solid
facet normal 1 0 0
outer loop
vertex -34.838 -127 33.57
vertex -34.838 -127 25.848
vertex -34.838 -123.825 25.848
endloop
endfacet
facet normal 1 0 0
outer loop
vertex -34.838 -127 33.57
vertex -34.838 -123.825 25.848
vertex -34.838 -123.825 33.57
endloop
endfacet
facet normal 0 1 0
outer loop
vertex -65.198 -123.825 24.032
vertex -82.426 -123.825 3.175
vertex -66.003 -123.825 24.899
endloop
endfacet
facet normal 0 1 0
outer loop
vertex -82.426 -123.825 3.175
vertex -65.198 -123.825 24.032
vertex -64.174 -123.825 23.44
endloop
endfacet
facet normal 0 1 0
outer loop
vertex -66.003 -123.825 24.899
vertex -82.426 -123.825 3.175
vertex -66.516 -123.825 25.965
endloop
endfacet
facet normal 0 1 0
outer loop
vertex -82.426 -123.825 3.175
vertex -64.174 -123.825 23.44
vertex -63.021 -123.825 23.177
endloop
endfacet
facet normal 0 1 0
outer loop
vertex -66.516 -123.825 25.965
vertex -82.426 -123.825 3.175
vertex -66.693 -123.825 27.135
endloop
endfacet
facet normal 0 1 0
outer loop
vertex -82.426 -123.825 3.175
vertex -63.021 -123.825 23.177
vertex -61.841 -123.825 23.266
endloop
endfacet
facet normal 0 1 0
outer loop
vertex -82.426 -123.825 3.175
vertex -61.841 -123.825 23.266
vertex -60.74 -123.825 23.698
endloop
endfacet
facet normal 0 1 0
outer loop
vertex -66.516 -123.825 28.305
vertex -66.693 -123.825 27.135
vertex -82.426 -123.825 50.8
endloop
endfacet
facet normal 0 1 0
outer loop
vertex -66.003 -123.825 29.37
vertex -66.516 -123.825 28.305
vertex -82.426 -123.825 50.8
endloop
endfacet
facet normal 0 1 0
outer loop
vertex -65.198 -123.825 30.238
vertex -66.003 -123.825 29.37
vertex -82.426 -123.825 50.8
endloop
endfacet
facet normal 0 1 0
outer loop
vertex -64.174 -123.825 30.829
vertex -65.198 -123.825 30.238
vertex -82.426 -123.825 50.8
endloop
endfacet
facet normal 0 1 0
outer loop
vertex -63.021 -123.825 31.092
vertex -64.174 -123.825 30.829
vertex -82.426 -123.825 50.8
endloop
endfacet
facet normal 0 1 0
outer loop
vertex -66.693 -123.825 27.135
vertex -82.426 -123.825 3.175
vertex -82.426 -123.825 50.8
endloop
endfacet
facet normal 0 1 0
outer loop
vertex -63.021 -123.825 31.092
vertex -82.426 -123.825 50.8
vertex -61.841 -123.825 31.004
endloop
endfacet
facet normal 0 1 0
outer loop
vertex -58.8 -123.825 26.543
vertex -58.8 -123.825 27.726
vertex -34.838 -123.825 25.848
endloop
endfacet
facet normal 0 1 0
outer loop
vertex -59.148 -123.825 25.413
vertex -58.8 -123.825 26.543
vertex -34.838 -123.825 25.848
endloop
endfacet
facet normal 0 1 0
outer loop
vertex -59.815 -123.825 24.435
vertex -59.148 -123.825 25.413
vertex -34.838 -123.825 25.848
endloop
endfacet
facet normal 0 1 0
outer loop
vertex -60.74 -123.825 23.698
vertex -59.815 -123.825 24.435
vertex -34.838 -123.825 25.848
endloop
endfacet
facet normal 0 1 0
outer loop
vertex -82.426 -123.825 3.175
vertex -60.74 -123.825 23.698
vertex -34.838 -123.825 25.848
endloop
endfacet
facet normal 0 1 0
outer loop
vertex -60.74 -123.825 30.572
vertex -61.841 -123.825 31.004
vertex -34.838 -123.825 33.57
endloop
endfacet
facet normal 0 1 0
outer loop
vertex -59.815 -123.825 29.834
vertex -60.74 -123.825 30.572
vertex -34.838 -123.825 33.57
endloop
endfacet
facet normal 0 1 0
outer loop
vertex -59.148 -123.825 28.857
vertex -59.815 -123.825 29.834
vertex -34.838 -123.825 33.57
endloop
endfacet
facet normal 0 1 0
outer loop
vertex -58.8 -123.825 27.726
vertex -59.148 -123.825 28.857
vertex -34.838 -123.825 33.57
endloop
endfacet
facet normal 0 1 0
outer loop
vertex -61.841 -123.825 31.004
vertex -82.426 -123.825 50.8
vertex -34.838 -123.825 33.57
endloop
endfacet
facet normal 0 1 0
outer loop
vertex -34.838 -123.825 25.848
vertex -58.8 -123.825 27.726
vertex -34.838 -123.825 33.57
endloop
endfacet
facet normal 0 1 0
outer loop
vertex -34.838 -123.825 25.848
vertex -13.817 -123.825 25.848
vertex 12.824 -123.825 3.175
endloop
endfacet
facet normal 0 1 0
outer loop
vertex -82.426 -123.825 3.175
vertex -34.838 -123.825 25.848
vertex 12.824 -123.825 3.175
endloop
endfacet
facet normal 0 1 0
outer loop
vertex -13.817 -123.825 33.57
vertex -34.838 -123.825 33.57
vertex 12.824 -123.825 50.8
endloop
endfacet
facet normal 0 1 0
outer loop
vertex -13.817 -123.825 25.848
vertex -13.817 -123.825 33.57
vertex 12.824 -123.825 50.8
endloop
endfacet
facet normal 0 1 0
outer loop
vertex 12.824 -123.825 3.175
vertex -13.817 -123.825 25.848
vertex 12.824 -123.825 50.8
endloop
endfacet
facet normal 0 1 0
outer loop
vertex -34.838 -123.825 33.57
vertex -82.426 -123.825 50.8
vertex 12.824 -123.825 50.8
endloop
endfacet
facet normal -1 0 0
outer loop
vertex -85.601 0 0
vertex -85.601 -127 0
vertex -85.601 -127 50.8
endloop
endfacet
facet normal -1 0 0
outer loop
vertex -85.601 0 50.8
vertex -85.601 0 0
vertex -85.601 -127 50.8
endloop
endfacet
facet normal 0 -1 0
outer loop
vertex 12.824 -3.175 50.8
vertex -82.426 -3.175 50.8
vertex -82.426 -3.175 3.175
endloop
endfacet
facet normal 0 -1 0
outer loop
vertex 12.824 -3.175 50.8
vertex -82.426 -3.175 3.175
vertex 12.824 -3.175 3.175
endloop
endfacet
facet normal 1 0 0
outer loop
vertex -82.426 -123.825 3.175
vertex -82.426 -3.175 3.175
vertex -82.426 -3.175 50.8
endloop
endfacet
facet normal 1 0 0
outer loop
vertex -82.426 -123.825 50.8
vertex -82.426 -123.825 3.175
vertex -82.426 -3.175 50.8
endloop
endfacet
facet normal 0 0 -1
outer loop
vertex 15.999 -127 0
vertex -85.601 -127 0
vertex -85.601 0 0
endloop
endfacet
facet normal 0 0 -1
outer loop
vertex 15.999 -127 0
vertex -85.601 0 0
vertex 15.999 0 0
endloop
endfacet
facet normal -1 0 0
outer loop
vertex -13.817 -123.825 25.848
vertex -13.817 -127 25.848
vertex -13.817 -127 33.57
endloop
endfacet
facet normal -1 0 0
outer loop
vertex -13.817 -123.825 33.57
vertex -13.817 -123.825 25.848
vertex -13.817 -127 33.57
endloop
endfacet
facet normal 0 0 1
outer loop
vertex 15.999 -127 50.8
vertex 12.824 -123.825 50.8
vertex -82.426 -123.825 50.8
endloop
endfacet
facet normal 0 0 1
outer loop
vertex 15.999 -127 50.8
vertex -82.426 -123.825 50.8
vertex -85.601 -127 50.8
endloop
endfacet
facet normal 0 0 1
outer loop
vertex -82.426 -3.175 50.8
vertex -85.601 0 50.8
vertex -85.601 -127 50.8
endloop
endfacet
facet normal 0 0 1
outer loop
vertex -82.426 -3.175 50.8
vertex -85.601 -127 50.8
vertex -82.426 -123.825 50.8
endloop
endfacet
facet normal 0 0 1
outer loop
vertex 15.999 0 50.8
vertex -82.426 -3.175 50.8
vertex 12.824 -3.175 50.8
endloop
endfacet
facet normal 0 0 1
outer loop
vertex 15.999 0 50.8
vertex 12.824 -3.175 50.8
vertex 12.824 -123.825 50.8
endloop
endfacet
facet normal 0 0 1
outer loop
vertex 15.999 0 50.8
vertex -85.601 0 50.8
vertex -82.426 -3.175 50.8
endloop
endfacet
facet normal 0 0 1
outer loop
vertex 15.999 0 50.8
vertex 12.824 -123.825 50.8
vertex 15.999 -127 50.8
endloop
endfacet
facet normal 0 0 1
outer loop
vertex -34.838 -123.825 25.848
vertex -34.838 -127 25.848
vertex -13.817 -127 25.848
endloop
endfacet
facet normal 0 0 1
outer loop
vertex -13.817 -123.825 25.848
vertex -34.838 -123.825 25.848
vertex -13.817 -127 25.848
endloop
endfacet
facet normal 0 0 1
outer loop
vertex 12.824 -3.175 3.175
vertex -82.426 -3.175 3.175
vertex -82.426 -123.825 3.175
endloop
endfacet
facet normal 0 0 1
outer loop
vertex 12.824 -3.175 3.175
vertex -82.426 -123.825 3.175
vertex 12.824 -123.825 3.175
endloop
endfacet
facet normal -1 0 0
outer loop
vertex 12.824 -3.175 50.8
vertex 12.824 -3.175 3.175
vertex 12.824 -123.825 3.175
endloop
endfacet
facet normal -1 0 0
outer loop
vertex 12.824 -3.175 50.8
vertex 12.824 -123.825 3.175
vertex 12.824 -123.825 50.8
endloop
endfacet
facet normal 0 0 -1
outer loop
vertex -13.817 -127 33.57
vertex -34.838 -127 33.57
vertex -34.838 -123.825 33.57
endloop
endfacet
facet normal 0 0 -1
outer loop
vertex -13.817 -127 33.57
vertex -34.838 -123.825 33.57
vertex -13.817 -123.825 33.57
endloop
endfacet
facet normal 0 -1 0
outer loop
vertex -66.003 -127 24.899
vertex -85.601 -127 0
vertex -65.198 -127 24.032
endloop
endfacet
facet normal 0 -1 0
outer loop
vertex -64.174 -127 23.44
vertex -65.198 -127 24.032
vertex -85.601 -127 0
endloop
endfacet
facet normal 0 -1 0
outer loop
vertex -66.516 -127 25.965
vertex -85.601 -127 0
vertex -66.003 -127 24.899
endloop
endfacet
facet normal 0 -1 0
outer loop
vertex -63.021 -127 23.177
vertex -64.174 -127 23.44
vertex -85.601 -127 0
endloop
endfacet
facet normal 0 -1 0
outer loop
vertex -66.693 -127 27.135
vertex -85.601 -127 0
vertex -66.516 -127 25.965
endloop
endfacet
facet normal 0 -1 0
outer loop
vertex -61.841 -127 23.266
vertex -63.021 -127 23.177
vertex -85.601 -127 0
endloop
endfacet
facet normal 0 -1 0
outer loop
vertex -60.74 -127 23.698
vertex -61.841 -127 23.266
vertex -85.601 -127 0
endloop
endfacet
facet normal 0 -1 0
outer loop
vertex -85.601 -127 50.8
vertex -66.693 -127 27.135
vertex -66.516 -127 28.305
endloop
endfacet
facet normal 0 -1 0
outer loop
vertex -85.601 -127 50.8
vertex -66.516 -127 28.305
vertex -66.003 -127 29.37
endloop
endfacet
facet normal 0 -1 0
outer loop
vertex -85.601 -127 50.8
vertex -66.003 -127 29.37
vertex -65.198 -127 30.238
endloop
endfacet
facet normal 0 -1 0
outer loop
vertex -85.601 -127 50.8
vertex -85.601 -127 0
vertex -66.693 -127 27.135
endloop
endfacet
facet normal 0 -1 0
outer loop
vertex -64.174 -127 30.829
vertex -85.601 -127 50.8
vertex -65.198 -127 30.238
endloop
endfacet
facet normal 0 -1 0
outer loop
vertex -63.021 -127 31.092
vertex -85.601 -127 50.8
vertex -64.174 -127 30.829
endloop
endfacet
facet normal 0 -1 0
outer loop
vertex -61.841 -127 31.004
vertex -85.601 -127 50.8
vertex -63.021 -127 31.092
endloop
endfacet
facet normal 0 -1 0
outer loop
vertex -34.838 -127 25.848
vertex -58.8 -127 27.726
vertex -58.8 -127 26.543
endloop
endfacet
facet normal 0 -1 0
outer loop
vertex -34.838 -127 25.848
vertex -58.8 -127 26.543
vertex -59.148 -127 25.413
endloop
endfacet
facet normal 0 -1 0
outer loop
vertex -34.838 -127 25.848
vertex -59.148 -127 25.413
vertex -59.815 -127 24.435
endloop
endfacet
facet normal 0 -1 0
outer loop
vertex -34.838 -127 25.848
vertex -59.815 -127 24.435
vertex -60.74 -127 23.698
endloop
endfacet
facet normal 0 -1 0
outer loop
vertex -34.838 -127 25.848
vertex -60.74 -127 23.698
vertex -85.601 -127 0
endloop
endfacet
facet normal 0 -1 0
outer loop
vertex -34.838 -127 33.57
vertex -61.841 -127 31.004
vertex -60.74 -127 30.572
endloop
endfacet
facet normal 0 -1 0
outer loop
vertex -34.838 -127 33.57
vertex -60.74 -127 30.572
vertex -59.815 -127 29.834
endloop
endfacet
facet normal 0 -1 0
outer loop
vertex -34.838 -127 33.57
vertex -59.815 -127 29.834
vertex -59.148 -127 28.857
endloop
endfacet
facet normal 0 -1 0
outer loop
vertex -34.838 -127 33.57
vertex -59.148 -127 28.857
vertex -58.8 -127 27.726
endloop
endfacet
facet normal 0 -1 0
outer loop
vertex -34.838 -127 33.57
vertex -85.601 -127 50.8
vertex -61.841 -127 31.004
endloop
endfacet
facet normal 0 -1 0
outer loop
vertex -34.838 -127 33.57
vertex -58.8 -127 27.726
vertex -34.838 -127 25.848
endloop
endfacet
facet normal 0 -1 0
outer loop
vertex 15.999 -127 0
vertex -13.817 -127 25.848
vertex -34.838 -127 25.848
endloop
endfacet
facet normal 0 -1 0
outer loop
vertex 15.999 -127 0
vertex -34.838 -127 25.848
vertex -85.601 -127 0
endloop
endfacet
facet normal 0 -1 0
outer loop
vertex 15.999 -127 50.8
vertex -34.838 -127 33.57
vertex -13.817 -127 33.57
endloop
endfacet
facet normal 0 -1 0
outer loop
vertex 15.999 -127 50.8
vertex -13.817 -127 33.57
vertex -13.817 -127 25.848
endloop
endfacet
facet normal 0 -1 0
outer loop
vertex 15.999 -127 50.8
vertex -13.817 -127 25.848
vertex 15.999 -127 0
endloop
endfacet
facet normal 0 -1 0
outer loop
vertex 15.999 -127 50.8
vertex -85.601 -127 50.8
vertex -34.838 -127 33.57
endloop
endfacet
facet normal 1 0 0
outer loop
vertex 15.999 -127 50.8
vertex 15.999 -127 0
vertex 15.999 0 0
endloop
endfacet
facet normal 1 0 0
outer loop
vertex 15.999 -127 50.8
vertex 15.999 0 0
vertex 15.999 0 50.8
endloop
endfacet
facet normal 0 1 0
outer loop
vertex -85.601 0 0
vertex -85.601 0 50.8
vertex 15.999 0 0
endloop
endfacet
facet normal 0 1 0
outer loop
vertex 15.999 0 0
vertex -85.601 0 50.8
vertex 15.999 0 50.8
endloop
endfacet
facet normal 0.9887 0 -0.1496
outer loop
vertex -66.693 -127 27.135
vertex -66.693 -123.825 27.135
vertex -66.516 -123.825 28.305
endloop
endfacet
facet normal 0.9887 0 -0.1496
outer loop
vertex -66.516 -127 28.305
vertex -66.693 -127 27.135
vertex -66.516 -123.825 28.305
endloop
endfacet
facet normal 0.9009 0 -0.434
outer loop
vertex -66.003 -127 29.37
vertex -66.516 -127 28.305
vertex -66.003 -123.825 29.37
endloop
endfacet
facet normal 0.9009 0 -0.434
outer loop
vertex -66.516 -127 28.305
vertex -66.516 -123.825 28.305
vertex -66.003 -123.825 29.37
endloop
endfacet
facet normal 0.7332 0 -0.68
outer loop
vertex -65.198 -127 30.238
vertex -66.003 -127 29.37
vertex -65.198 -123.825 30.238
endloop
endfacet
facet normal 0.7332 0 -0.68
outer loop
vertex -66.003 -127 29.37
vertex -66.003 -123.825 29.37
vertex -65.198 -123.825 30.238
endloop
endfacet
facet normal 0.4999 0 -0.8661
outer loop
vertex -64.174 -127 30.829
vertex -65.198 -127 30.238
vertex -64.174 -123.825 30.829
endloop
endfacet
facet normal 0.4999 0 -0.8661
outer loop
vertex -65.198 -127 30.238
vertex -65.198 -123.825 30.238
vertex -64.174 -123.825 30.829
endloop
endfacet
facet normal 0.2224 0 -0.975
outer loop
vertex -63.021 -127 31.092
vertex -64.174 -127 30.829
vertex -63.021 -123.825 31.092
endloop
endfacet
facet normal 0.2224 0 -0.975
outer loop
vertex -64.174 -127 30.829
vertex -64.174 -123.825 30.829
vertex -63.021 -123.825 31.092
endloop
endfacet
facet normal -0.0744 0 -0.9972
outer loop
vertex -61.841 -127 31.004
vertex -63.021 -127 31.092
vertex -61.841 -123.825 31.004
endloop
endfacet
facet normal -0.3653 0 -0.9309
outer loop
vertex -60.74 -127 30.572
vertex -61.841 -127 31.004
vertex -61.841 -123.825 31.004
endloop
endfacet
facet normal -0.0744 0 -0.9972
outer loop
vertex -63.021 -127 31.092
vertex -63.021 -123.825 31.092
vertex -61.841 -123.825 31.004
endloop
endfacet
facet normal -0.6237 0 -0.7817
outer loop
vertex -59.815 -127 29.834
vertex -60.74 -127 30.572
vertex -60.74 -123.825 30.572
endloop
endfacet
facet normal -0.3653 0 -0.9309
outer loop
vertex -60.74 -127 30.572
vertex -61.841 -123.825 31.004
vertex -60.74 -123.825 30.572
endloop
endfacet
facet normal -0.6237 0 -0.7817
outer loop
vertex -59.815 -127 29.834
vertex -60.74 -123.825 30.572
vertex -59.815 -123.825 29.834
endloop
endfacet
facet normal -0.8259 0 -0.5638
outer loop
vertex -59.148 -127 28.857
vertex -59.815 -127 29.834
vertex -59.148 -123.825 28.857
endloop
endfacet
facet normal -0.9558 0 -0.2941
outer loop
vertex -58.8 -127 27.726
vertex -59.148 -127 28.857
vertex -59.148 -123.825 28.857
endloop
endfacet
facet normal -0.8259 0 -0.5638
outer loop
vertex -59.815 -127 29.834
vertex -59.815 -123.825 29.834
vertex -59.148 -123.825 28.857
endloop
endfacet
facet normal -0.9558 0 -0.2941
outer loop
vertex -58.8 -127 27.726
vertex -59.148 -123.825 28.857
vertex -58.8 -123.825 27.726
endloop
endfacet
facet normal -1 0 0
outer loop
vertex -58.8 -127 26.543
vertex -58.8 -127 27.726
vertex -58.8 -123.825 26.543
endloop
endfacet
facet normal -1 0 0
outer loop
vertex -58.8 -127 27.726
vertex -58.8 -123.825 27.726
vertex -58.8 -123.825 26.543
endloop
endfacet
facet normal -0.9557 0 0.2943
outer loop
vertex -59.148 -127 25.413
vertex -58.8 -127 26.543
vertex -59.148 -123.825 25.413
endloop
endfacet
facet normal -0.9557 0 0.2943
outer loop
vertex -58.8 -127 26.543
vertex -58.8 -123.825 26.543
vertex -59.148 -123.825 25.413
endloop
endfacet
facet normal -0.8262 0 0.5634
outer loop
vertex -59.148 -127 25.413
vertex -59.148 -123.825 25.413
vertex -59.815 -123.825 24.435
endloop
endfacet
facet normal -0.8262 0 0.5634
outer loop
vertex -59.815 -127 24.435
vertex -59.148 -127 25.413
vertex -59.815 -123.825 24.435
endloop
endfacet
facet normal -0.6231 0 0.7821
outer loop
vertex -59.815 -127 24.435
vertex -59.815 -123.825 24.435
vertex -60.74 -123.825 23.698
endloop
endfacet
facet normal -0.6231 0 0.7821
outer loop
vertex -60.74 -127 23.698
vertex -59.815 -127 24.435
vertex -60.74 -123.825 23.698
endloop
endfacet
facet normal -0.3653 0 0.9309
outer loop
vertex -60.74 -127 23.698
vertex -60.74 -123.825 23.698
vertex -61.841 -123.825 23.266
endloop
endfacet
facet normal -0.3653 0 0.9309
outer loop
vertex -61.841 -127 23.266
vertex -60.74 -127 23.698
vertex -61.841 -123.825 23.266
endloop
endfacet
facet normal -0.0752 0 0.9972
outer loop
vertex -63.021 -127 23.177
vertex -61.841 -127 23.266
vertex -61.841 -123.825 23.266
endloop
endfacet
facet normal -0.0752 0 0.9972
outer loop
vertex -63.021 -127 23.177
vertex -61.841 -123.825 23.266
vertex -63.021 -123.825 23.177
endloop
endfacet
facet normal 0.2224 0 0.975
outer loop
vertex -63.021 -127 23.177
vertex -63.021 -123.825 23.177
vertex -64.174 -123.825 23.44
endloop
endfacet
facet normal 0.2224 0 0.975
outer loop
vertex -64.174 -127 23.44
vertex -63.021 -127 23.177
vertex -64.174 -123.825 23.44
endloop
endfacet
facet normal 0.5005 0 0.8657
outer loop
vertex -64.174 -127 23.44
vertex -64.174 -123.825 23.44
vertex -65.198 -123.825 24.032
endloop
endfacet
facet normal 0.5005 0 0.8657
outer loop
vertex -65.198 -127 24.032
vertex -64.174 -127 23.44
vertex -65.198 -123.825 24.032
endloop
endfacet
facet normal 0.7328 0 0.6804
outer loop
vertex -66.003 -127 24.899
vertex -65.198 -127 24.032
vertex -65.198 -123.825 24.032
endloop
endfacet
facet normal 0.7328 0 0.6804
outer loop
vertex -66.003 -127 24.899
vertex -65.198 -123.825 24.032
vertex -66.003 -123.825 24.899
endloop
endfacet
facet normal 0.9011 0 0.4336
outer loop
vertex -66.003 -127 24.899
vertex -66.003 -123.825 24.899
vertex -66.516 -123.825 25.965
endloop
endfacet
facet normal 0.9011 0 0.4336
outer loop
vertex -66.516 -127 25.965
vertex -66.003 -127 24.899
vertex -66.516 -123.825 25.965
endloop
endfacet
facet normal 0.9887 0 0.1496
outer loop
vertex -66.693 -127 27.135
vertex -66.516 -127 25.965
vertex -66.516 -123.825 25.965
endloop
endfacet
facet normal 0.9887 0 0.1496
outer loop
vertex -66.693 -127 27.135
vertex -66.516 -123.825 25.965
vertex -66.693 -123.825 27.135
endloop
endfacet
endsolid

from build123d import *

# Parameters (mm, degrees)
F0_W     = 101.6
F0_H     = 50.8
F1_DEPTH = 127
F2_T     = -3.175
F4_D     = 7.9375
F4_DEPTH = 12.7
F5_W     = 21.021394
F5_H     = 7.722143
F6_DEPTH = 3.175


with BuildPart() as f1:
    # F0 (on Front) → F1 (new body)
    with BuildSketch(Plane.XZ):
        with Locations((-34.801298, 25.4)):
            Rectangle(F0_W, F0_H)
    extrude(amount=F1_DEPTH)

    # F2
    f2_openings = [f1.faces().sort_by_distance(p)[0] for p in [
        (-34.801298, -63.5, 50.8),
    ]]
    offset(amount=F2_T, openings=f2_openings)

    # F4
    with Locations(Plane.XZ.offset(127)):
        with Locations((-62.723987, 27.134759)):
            Hole(F4_D / 2, depth=F4_DEPTH)

    # F5 (on face) → F6 (cut, through all)
    with BuildSketch(Plane.XZ.offset(127)):
        with Locations((-24.327768, 29.708806)):
            Rectangle(F5_W, F5_H)
    extrude(amount=-F6_DEPTH, mode=Mode.SUBTRACT)


solid = f1.part
